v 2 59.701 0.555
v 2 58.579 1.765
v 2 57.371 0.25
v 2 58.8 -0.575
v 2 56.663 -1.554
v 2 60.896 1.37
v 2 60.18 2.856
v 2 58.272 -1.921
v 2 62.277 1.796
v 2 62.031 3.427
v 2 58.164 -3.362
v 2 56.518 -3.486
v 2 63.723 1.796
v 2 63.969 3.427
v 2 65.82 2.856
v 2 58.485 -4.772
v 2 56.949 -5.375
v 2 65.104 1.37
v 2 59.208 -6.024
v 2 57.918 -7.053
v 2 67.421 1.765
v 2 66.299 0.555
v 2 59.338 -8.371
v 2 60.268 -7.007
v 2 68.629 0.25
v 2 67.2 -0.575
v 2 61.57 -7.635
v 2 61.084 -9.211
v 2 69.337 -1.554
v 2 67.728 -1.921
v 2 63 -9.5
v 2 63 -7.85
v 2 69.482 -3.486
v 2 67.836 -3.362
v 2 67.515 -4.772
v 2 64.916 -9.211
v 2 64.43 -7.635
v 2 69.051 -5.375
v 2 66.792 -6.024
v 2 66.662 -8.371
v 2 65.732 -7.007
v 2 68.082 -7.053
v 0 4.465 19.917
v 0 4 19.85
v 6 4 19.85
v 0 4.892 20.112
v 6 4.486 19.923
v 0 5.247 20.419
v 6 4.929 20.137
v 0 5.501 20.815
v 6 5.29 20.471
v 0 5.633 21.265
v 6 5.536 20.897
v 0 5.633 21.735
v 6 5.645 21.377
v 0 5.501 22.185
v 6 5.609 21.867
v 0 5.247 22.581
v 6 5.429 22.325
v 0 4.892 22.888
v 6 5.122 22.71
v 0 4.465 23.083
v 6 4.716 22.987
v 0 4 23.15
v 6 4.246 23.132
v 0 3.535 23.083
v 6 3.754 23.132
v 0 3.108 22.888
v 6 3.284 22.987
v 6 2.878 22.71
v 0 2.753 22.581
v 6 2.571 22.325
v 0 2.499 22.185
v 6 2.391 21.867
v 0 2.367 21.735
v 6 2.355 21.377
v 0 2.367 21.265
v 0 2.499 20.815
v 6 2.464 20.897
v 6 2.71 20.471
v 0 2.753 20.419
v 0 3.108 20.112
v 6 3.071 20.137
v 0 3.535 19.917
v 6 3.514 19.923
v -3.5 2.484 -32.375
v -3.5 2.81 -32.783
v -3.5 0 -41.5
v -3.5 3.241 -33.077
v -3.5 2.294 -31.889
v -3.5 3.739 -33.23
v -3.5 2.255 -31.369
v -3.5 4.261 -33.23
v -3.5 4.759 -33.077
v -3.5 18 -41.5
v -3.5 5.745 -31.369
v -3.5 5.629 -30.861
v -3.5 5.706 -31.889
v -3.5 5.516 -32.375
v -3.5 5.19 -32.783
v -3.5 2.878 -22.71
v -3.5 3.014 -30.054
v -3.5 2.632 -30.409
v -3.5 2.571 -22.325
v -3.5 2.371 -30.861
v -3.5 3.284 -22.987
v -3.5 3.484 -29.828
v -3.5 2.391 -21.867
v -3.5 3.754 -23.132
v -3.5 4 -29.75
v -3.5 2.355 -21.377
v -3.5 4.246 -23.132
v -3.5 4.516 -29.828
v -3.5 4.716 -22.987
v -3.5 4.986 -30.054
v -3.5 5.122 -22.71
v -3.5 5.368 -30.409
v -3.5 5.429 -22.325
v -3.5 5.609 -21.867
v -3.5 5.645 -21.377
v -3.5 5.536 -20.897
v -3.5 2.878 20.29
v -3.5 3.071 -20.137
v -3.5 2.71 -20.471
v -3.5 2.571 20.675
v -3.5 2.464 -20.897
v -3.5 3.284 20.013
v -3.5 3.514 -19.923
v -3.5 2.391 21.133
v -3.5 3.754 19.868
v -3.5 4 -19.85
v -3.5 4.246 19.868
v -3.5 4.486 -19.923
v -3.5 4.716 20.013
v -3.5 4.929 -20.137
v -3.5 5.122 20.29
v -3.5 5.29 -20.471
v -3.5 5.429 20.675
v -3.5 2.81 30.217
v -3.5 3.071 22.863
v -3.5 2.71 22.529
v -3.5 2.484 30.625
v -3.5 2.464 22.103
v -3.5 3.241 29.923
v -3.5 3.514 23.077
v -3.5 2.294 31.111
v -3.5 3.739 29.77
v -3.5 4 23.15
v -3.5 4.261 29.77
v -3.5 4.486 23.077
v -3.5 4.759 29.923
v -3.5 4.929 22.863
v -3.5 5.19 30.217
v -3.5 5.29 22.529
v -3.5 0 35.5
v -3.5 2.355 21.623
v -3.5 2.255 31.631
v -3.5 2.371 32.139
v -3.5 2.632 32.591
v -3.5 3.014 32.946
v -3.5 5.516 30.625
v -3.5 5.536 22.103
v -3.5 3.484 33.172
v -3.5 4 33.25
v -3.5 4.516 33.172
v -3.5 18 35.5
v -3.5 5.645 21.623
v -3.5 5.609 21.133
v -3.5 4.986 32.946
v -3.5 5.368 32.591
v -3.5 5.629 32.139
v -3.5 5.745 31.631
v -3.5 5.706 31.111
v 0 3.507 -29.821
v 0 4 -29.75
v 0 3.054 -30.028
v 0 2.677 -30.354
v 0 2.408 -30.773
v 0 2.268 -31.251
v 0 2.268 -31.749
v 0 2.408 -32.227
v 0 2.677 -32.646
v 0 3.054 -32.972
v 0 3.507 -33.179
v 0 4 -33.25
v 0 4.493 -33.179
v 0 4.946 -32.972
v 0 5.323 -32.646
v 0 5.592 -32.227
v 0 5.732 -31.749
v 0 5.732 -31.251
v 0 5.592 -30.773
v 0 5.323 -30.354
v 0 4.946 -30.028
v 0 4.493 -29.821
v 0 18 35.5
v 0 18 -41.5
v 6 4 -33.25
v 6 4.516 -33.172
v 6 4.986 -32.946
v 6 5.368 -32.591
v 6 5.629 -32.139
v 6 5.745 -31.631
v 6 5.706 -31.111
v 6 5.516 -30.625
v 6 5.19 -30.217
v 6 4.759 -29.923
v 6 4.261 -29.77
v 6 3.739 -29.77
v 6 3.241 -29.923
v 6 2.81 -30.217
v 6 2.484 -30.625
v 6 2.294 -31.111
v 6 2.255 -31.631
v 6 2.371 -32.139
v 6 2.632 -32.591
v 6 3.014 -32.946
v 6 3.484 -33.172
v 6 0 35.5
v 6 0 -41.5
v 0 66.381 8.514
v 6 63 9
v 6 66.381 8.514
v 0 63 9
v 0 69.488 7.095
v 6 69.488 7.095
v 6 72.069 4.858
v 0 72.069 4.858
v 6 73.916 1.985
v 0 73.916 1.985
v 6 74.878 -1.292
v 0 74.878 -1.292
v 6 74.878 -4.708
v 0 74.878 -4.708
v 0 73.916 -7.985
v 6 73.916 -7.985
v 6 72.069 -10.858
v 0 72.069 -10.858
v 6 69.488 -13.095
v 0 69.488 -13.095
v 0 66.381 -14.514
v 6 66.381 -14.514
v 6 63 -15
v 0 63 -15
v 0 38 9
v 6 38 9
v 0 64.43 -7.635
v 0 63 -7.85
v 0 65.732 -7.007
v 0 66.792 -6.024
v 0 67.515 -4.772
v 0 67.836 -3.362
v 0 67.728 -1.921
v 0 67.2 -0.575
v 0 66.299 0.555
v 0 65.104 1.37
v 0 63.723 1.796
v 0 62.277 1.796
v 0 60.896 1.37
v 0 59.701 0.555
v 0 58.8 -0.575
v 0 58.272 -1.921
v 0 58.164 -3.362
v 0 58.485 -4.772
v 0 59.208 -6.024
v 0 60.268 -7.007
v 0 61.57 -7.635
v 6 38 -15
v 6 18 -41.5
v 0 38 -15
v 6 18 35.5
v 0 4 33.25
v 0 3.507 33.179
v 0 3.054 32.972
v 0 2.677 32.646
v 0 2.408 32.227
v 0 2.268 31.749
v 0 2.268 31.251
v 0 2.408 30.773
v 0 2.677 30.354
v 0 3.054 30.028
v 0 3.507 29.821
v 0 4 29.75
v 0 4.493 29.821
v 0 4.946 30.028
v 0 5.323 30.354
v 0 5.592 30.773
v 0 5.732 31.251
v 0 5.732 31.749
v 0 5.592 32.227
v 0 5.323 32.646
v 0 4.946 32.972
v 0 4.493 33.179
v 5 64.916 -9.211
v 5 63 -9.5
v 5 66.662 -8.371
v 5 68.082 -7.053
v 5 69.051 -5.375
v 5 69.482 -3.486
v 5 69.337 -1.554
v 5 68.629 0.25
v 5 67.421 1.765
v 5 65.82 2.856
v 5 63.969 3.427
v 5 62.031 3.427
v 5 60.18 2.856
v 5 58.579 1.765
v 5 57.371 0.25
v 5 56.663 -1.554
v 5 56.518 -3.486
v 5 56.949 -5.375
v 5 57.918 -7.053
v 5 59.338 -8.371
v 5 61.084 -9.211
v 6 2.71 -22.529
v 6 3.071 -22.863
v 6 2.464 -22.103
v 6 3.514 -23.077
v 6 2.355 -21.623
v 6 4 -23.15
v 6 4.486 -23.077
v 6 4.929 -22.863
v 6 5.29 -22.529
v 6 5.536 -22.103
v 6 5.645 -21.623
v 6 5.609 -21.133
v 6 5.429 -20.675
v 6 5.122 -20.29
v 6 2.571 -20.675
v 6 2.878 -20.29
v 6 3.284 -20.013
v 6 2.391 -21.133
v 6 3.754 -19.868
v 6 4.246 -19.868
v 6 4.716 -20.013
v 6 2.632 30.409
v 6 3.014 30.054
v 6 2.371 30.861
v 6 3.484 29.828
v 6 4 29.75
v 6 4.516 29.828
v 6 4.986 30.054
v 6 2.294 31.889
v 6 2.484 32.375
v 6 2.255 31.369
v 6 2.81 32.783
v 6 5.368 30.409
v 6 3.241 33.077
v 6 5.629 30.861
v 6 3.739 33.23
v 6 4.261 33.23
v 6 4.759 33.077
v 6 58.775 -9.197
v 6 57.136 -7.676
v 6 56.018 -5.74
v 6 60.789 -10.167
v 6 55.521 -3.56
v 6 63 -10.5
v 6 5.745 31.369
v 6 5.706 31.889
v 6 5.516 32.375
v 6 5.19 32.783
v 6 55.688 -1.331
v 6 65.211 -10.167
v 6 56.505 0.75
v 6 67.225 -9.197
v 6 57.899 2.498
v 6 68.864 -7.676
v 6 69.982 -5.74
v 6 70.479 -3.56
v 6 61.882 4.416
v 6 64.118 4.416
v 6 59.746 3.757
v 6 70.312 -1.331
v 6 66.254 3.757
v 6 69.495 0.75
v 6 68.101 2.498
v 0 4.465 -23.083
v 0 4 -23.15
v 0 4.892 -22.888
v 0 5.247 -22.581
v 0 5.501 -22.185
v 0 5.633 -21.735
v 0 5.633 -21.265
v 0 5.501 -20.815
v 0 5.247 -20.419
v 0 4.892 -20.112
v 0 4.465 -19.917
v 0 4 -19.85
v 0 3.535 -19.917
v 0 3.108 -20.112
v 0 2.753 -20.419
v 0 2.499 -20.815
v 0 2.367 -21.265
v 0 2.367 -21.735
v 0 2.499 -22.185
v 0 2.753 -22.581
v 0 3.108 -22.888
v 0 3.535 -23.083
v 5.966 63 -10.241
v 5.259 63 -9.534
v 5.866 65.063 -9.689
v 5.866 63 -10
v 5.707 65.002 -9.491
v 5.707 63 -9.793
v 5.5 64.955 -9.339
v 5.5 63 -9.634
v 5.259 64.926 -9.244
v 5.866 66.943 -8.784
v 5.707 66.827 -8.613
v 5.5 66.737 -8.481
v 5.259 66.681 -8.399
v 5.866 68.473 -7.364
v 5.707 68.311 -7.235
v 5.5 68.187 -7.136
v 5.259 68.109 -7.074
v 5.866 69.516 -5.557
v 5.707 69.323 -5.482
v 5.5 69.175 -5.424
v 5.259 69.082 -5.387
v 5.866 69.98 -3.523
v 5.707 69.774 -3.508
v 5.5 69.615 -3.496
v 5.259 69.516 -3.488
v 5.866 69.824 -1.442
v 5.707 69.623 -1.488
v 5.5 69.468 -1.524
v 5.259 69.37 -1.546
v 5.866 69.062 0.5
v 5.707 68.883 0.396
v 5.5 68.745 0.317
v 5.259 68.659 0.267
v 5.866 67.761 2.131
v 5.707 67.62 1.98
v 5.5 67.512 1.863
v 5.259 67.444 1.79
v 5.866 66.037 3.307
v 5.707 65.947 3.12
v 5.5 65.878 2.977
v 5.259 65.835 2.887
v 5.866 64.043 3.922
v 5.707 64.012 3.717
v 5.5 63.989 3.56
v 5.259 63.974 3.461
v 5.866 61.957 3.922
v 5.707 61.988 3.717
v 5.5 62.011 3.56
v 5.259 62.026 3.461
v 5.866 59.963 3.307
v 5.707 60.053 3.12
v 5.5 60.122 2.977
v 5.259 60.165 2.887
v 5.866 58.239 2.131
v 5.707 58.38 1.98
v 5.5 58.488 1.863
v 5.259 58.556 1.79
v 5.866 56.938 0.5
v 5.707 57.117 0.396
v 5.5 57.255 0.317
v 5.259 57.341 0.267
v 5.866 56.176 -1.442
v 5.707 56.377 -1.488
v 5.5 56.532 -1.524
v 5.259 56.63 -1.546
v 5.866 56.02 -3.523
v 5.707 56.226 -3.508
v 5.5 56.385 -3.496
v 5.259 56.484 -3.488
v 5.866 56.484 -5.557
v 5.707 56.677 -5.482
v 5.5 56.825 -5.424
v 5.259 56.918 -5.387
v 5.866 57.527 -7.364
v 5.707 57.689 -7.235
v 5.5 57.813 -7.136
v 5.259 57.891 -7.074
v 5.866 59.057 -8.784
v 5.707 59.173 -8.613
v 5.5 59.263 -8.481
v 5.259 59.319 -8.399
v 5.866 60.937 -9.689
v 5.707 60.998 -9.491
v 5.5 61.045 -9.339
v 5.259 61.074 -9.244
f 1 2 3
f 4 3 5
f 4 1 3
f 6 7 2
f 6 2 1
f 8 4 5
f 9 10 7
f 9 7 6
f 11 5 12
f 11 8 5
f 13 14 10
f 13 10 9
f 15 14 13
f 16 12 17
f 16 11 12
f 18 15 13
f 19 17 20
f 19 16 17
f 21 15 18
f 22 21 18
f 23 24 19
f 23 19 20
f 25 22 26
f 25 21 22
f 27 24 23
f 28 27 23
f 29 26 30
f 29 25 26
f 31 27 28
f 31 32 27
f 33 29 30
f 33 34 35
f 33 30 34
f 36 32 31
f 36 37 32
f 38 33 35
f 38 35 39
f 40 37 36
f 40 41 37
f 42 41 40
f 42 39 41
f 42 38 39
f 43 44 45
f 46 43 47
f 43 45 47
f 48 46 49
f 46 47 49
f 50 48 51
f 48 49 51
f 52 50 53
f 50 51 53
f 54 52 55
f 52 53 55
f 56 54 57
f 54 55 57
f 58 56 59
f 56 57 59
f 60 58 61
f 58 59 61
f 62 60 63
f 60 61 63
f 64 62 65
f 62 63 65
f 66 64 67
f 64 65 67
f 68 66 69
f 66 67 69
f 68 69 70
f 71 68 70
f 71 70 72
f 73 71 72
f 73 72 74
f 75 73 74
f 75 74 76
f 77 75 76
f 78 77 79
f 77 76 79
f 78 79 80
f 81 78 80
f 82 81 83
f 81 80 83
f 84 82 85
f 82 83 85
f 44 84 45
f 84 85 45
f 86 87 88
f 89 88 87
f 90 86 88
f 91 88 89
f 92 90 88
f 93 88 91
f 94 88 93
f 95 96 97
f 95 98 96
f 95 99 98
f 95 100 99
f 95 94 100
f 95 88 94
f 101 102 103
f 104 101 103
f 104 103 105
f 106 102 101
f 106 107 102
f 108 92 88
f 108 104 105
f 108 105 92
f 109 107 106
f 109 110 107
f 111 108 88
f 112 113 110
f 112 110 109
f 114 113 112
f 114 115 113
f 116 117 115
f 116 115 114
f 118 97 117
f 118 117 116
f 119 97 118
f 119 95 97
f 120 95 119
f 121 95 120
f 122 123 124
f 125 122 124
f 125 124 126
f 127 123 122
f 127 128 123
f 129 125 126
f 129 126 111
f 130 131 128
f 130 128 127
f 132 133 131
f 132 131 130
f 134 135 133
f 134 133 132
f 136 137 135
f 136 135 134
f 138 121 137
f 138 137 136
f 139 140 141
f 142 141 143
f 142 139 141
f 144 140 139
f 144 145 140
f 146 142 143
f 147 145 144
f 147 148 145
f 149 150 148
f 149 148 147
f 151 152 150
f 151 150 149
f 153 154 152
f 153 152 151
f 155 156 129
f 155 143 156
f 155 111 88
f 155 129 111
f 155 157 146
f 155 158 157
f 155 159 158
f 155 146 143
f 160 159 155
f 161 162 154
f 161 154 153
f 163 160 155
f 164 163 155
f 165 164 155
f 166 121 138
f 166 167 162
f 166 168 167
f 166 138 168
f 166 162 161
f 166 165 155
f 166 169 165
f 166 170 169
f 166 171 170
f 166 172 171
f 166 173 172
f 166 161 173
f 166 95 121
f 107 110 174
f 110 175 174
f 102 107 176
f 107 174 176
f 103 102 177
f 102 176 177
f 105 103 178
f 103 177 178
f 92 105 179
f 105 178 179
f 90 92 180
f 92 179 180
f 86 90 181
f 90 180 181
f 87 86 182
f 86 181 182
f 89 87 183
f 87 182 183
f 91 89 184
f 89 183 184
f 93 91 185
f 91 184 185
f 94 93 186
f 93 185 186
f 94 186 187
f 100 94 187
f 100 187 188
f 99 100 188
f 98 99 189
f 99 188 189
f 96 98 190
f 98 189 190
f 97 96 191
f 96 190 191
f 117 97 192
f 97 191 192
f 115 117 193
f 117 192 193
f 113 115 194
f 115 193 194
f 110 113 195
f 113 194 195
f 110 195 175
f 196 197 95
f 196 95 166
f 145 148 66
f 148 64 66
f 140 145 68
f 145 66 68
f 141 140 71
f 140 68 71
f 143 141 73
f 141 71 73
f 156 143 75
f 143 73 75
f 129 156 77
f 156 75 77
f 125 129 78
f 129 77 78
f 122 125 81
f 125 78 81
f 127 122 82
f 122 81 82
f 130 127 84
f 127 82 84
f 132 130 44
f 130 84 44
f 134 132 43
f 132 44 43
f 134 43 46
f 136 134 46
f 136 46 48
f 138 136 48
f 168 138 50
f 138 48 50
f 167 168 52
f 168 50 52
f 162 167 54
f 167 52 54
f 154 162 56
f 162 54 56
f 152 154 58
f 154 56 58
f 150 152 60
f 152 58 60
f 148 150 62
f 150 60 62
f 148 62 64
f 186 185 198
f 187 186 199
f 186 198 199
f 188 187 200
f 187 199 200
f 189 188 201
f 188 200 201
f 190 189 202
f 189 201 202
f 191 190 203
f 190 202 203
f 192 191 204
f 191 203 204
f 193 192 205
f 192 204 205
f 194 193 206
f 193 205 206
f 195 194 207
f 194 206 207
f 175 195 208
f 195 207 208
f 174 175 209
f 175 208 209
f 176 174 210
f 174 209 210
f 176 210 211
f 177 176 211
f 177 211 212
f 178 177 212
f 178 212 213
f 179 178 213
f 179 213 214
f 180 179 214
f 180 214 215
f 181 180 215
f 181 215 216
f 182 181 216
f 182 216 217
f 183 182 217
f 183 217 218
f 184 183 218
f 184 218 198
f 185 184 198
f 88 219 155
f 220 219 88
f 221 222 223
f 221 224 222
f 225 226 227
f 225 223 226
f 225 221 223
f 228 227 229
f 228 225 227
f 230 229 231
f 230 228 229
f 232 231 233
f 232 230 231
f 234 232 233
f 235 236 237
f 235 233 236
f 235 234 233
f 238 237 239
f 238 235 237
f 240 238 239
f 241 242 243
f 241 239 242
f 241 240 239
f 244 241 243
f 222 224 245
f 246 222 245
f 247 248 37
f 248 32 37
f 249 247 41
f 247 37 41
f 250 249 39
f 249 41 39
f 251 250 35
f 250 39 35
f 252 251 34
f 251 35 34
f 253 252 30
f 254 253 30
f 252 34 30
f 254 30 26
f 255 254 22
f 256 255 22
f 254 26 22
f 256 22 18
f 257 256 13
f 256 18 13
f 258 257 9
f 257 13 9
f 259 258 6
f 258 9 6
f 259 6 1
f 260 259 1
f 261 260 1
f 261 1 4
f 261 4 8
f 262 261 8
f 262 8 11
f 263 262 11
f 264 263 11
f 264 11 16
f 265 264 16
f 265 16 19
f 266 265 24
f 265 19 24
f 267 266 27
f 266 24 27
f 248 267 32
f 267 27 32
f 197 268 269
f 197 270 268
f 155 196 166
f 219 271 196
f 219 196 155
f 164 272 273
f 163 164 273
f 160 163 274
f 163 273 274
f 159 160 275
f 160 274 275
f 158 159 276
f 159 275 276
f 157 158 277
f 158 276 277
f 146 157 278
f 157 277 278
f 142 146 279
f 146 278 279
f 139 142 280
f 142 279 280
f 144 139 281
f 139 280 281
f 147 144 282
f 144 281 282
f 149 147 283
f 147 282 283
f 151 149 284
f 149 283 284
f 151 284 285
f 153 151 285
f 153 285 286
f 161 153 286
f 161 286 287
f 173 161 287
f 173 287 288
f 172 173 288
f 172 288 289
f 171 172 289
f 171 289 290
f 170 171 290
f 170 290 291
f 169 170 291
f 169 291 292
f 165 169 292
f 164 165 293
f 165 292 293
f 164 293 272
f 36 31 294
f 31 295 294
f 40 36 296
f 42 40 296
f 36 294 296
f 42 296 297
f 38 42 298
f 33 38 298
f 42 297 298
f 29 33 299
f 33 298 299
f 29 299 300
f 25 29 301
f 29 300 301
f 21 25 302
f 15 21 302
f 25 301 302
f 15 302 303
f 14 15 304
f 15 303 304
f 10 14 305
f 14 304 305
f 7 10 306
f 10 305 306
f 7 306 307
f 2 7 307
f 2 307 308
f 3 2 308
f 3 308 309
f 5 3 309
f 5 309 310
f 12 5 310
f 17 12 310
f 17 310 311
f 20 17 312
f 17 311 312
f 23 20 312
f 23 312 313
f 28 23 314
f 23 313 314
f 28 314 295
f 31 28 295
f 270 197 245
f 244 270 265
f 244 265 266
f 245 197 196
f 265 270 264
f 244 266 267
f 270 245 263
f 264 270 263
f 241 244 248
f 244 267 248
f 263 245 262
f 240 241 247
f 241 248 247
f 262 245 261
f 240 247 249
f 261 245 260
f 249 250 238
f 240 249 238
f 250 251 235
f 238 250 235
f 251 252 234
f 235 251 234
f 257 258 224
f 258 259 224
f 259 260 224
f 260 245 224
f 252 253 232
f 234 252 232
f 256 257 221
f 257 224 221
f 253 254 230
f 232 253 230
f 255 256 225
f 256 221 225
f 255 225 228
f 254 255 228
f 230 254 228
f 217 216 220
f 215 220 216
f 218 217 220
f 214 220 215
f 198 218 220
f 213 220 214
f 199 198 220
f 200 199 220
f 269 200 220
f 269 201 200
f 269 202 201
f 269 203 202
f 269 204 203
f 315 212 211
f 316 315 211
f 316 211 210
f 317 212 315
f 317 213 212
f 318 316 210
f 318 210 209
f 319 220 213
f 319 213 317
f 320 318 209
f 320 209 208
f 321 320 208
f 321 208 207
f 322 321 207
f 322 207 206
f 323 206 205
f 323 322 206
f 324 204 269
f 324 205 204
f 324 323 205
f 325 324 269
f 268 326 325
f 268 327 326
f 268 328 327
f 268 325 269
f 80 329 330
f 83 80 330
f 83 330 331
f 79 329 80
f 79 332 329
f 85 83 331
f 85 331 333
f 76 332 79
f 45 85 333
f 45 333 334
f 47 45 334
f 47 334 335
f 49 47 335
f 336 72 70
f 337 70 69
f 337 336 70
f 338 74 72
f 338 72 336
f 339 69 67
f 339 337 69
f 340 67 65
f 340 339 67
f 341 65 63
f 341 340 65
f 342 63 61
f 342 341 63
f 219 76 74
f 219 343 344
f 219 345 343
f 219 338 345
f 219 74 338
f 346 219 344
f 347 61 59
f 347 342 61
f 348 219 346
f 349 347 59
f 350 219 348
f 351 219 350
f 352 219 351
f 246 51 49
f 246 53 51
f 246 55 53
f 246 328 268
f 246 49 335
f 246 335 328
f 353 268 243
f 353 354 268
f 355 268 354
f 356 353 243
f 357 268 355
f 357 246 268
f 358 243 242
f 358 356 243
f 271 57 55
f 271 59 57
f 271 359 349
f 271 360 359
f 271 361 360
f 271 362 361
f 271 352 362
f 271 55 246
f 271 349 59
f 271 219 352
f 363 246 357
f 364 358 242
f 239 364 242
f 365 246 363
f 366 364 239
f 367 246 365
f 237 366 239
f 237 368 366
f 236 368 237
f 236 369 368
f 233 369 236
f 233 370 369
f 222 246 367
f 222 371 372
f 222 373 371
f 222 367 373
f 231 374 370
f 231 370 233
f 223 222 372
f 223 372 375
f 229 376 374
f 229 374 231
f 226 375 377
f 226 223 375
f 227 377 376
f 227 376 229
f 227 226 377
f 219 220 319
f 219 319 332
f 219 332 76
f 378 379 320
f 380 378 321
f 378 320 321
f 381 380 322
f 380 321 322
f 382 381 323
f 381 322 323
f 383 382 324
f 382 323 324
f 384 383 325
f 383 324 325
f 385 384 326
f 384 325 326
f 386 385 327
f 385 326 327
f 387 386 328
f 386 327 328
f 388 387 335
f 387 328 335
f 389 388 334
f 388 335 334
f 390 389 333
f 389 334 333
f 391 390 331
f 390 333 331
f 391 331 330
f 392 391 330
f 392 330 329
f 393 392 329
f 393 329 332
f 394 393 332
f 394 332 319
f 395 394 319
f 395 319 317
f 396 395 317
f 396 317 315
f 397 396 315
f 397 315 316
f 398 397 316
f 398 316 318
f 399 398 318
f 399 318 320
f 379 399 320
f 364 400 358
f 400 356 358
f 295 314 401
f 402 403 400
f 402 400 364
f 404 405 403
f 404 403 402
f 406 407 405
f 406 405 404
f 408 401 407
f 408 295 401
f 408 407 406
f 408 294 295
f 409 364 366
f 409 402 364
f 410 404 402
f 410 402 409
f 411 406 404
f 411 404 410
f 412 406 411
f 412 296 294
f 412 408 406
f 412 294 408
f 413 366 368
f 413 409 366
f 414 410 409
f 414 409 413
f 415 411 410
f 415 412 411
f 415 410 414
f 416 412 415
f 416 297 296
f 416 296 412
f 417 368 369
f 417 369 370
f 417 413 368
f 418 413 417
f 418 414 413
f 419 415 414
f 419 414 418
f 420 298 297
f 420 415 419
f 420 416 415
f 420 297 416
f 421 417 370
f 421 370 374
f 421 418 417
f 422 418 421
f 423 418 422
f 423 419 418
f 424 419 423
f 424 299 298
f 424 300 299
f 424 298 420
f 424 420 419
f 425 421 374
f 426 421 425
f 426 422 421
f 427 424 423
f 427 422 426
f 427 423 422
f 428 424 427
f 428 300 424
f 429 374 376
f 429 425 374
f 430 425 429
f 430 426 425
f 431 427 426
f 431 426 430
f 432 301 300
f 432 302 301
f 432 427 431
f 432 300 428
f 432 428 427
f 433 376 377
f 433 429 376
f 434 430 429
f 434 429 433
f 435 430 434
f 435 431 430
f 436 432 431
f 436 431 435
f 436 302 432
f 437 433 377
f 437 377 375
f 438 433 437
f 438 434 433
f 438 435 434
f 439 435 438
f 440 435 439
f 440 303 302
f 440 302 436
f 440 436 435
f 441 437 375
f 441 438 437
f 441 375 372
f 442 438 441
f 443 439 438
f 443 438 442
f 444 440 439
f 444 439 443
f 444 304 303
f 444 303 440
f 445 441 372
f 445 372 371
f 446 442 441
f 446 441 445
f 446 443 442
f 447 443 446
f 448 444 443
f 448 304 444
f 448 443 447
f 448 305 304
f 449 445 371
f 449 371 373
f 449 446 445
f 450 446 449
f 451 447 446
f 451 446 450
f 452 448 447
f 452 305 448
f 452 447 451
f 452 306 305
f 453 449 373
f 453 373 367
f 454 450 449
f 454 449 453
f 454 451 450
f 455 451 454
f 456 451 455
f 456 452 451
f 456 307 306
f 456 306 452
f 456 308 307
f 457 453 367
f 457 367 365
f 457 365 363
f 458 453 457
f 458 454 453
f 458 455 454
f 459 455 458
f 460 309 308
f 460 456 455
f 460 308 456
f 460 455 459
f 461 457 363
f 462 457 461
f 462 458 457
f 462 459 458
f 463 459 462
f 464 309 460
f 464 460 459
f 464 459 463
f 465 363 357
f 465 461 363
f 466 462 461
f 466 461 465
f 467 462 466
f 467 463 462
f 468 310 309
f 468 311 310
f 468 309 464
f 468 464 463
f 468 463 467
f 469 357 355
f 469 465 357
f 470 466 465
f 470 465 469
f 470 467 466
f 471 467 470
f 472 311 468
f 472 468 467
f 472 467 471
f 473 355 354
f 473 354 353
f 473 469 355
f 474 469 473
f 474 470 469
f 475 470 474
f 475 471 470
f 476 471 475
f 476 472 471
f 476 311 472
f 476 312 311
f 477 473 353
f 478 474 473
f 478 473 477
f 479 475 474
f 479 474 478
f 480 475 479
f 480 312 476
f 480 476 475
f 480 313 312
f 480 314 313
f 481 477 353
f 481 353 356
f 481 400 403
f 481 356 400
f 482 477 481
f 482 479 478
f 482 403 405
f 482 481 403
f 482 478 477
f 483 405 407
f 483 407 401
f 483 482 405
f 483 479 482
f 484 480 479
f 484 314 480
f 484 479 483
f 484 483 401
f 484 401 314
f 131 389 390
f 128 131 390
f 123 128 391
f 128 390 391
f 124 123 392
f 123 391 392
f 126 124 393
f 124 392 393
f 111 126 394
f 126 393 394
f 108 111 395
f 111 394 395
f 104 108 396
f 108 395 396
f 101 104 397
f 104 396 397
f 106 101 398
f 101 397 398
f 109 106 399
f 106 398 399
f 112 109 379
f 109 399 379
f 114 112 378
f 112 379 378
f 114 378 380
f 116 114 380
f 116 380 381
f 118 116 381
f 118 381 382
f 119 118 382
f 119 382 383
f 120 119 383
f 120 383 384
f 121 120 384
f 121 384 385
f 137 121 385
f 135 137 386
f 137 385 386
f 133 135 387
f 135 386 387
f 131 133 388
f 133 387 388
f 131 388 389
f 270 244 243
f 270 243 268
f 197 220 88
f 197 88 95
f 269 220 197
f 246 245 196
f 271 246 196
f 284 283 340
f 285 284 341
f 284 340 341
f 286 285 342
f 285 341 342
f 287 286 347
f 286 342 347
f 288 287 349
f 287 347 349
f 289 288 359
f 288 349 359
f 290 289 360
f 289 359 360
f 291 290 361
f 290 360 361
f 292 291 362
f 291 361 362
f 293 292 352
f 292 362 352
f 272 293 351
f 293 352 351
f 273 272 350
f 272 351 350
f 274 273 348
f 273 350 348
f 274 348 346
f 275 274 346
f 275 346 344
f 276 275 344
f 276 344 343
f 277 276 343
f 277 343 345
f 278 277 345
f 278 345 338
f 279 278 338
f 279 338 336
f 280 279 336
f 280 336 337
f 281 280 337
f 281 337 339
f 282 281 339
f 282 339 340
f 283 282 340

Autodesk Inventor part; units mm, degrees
ref_plane "YZ Plane" through (0, 0, 0) normal (1, 0, 0) x (0, 1, 0)
ref_plane "XZ Plane" through (0, 0, 0) normal (0, 1, 0) x (-1, 0, 0)
ref_plane "XY Plane" through (0, 0, 0) normal (0, 0, 1) x (1, 0, 0)
sketch "스케치1" plane through (0, 0, 0) normal (1, 0, 0) x (0, 1, 0)
  line L0 (0, -41.5) -> (18, -41.5)
  line L1 (18, -41.5) -> (18, 59.6584) construction
  line L2 (0, 0) -> (0, -41.5)
  line L3 (84.3904, -3) -> (-15.1692, -3) construction
  arc A0 (63, -15) -> (75, -3) centre (63, -3) ccw
  line L4 (63, -15) -> (38, -15)
  line L5 (38, -15) -> (18, -41.5)
  line L6 (0, 35.5) -> (18, 35.5)
  line L7 (0, 0) -> (0, 35.5)
  arc A1 (75, -3) -> (63, 9) centre (63, -3) ccw
  line L8 (63, 9) -> (38, 9)
  line L9 (38, 9) -> (18, 35.5)
  dimension "d0" = 18
  dimension "d8" = 45
  dimension "d9" = 25
  dimension "d32" = 12
extrude "돌출1" add sketch "스케치1" along normal blind 6
sketch "스케치2" plane through (6, 0, 0) normal (1, 0, 0) x (0, 0, -1)
  line L0 (-58.8675, 4) -> (65.7315, 4) construction
  line L1 (-35.5, 0) -> (41.5, 0) projected
  circle A0 centre (31.5, 4) radius 1.75
  circle A1 centre (21.5, 4) radius 1.65
  line L2 (41.5, 0) -> (41.5, 18) projected
  line L3 (0, 13.8041) -> (0, -7.7982) construction
  circle A2 centre (-31.5, 4) radius 1.75
  circle A3 centre (-21.5, 4) radius 1.65
  point P0 (0, 0)
  dimension "d12" = 4
  dimension "d13" = 3.5
  dimension "d14" = 3.3
  dimension "d15" = 10
  dimension "d16" = 20
extrude "돌출2" cut sketch "스케치2" against normal blind 6
sketch "스케치4" plane through (6, 0, 0) normal (1, 0, 0) x (0, 0, -1)
  arc A0 (15, 63) -> (-9, 63) centre (3, 63) ccw projected
  circle A1 centre (3, 63) radius 6.5
  point P0 (0, 0)
  dimension "d25" = 13
extrude "돌출4" cut sketch "스케치4" against normal blind 4
sketch "스케치5" plane through (2, 63, -3) normal (1, 0, 0) x (0, 0, -1)
  circle A0 centre (0, 0) radius 4.85
  point P0 (-3, -63)
  dimension "d28" = 9.7
extrude "돌출5" cut sketch "스케치5" against normal blind 2
fillet "모깎기1" radius 1 1 edges at (6, 63, 3.5)
sketch "스케치6" plane through (0, 0, 0) normal (-1, 0, 0) x (0, 0, 1)
  line L0 (-41.5, 0) -> (-41.5, 18) projected
  line L1 (35.5, 0) -> (-41.5, 0) projected
  line L2 (-41.5, 18) -> (35.5, 18)
  line L3 (35.5, 18) -> (35.5, 0)
  line L4 (35.5, 0) -> (-41.5, 0)
  line L5 (-41.5, 0) -> (-41.5, 18)
  circle A0 centre (-31.5, 4) radius 1.75 projected
  circle A1 centre (-31.5, 4) radius 1.75
  circle A2 centre (-21.5, 4) radius 1.65 projected
  circle A3 centre (-21.5, 4) radius 1.65
  circle A4 centre (21.5, 4) radius 1.65 projected
  circle A5 centre (21.5, 4) radius 1.65
  circle A6 centre (31.5, 4) radius 1.75 projected
  circle A7 centre (31.5, 4) radius 1.75
  point P0 (0, 0)
extrude "돌출6" add sketch "스케치6" along normal blind 3.5
properties part number "탑(옆면수정)"
